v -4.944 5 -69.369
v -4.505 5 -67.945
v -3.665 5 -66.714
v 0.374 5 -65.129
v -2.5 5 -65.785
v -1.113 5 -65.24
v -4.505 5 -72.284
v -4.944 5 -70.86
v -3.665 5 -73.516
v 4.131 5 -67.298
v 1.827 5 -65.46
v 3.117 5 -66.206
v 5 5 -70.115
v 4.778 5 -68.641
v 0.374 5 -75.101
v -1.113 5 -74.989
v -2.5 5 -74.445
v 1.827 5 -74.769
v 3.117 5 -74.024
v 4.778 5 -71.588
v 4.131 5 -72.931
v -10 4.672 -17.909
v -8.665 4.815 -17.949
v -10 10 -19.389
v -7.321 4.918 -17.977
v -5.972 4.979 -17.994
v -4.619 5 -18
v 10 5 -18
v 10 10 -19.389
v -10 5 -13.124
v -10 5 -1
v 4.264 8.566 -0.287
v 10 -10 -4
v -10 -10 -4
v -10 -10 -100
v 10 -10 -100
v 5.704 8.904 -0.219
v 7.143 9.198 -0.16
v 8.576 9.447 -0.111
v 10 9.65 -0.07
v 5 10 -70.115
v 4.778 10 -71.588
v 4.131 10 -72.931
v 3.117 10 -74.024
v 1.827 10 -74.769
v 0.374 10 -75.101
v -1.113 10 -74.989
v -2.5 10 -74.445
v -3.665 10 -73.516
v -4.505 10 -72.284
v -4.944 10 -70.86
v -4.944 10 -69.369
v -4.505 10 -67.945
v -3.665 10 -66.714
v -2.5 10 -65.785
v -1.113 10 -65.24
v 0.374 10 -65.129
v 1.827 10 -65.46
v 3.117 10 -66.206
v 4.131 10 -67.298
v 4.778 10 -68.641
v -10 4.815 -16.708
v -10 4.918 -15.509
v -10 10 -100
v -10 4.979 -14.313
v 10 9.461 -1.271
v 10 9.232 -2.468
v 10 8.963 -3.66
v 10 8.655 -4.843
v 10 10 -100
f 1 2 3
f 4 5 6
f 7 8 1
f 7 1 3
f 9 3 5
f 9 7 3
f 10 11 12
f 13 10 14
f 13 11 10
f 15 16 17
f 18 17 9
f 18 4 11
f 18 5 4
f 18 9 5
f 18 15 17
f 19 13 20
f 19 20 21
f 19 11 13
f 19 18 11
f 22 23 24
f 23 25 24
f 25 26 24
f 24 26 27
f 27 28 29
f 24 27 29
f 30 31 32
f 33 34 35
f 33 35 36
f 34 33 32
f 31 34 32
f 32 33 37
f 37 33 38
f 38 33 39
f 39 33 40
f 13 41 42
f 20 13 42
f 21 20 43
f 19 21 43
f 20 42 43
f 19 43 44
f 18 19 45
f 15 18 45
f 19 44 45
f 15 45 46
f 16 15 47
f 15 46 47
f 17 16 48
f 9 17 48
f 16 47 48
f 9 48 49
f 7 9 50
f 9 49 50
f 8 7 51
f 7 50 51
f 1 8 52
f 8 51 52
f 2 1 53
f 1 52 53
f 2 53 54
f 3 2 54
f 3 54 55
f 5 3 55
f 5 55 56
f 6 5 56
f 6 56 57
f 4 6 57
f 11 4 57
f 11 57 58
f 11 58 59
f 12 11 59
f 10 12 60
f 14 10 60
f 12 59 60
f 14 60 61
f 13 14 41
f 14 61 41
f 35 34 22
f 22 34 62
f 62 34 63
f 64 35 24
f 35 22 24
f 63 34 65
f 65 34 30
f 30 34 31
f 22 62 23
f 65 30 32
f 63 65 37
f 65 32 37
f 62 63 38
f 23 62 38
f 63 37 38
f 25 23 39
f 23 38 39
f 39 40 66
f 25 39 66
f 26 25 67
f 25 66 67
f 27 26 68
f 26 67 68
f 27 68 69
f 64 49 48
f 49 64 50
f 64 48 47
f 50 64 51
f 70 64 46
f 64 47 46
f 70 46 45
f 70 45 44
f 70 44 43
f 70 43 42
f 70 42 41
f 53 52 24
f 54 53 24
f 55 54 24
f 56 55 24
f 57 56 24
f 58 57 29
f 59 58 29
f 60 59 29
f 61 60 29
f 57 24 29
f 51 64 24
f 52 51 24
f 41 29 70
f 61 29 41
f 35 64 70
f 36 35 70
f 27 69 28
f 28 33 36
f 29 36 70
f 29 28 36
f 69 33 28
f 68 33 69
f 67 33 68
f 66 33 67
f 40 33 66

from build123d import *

# Parameters (mm, degrees)
SKETCH1_W           = 20
SKETCH1_H           = 20
BOSS_EXTRUDE1_DEPTH = 100
CUT_EXTRUDE3_DEPTH  = 20
CUT_EXTRUDE4_DEPTH  = 18
FILLET3_R           = 20
SKETCH6_R           = 5
CUT_EXTRUDE5_DEPTH  = 5


with BuildPart() as part:
    # Sketch1 → Boss-Extrude1 (new body)
    with BuildSketch(Plane.XY):
        Rectangle(SKETCH1_W, SKETCH1_H)
    extrude(amount=-BOSS_EXTRUDE1_DEPTH)

    # Sketch4 → Cut-Extrude3 (cut)
    with BuildSketch(Plane(origin=(10, 0, 0), x_dir=(0, 0, -1), z_dir=(1, 0, 0))):
        Polygon((19.388888889, 10), (0, 10), (18, 5), align=None)
        Polygon((4, -10), (0, 10), (0, -10), align=None)
    extrude(amount=-CUT_EXTRUDE3_DEPTH, mode=Mode.SUBTRACT)

    # Sketch5 → Cut-Extrude4 (cut)
    with BuildSketch(Plane.XY):
        Polygon((-10, 5), (10, 10), (-10, 10), align=None)
    extrude(amount=-CUT_EXTRUDE4_DEPTH, mode=Mode.SUBTRACT)

    # Fillet3
    fillet3_edges = [part.edges().sort_by_distance(p)[0] for p in [
        (0, 7.5, -9),
    ]]
    fillet(fillet3_edges, radius=FILLET3_R)

    # Sketch6 → Cut-Extrude5 (cut)
    with BuildSketch(Plane(origin=(0, 10, 0), x_dir=(1, 0, 0), z_dir=(0, 1, 0))):
        with Locations((0, 70.114708412)):
            Circle(SKETCH6_R)
    extrude(amount=-CUT_EXTRUDE5_DEPTH, mode=Mode.SUBTRACT)


solid = part.part
